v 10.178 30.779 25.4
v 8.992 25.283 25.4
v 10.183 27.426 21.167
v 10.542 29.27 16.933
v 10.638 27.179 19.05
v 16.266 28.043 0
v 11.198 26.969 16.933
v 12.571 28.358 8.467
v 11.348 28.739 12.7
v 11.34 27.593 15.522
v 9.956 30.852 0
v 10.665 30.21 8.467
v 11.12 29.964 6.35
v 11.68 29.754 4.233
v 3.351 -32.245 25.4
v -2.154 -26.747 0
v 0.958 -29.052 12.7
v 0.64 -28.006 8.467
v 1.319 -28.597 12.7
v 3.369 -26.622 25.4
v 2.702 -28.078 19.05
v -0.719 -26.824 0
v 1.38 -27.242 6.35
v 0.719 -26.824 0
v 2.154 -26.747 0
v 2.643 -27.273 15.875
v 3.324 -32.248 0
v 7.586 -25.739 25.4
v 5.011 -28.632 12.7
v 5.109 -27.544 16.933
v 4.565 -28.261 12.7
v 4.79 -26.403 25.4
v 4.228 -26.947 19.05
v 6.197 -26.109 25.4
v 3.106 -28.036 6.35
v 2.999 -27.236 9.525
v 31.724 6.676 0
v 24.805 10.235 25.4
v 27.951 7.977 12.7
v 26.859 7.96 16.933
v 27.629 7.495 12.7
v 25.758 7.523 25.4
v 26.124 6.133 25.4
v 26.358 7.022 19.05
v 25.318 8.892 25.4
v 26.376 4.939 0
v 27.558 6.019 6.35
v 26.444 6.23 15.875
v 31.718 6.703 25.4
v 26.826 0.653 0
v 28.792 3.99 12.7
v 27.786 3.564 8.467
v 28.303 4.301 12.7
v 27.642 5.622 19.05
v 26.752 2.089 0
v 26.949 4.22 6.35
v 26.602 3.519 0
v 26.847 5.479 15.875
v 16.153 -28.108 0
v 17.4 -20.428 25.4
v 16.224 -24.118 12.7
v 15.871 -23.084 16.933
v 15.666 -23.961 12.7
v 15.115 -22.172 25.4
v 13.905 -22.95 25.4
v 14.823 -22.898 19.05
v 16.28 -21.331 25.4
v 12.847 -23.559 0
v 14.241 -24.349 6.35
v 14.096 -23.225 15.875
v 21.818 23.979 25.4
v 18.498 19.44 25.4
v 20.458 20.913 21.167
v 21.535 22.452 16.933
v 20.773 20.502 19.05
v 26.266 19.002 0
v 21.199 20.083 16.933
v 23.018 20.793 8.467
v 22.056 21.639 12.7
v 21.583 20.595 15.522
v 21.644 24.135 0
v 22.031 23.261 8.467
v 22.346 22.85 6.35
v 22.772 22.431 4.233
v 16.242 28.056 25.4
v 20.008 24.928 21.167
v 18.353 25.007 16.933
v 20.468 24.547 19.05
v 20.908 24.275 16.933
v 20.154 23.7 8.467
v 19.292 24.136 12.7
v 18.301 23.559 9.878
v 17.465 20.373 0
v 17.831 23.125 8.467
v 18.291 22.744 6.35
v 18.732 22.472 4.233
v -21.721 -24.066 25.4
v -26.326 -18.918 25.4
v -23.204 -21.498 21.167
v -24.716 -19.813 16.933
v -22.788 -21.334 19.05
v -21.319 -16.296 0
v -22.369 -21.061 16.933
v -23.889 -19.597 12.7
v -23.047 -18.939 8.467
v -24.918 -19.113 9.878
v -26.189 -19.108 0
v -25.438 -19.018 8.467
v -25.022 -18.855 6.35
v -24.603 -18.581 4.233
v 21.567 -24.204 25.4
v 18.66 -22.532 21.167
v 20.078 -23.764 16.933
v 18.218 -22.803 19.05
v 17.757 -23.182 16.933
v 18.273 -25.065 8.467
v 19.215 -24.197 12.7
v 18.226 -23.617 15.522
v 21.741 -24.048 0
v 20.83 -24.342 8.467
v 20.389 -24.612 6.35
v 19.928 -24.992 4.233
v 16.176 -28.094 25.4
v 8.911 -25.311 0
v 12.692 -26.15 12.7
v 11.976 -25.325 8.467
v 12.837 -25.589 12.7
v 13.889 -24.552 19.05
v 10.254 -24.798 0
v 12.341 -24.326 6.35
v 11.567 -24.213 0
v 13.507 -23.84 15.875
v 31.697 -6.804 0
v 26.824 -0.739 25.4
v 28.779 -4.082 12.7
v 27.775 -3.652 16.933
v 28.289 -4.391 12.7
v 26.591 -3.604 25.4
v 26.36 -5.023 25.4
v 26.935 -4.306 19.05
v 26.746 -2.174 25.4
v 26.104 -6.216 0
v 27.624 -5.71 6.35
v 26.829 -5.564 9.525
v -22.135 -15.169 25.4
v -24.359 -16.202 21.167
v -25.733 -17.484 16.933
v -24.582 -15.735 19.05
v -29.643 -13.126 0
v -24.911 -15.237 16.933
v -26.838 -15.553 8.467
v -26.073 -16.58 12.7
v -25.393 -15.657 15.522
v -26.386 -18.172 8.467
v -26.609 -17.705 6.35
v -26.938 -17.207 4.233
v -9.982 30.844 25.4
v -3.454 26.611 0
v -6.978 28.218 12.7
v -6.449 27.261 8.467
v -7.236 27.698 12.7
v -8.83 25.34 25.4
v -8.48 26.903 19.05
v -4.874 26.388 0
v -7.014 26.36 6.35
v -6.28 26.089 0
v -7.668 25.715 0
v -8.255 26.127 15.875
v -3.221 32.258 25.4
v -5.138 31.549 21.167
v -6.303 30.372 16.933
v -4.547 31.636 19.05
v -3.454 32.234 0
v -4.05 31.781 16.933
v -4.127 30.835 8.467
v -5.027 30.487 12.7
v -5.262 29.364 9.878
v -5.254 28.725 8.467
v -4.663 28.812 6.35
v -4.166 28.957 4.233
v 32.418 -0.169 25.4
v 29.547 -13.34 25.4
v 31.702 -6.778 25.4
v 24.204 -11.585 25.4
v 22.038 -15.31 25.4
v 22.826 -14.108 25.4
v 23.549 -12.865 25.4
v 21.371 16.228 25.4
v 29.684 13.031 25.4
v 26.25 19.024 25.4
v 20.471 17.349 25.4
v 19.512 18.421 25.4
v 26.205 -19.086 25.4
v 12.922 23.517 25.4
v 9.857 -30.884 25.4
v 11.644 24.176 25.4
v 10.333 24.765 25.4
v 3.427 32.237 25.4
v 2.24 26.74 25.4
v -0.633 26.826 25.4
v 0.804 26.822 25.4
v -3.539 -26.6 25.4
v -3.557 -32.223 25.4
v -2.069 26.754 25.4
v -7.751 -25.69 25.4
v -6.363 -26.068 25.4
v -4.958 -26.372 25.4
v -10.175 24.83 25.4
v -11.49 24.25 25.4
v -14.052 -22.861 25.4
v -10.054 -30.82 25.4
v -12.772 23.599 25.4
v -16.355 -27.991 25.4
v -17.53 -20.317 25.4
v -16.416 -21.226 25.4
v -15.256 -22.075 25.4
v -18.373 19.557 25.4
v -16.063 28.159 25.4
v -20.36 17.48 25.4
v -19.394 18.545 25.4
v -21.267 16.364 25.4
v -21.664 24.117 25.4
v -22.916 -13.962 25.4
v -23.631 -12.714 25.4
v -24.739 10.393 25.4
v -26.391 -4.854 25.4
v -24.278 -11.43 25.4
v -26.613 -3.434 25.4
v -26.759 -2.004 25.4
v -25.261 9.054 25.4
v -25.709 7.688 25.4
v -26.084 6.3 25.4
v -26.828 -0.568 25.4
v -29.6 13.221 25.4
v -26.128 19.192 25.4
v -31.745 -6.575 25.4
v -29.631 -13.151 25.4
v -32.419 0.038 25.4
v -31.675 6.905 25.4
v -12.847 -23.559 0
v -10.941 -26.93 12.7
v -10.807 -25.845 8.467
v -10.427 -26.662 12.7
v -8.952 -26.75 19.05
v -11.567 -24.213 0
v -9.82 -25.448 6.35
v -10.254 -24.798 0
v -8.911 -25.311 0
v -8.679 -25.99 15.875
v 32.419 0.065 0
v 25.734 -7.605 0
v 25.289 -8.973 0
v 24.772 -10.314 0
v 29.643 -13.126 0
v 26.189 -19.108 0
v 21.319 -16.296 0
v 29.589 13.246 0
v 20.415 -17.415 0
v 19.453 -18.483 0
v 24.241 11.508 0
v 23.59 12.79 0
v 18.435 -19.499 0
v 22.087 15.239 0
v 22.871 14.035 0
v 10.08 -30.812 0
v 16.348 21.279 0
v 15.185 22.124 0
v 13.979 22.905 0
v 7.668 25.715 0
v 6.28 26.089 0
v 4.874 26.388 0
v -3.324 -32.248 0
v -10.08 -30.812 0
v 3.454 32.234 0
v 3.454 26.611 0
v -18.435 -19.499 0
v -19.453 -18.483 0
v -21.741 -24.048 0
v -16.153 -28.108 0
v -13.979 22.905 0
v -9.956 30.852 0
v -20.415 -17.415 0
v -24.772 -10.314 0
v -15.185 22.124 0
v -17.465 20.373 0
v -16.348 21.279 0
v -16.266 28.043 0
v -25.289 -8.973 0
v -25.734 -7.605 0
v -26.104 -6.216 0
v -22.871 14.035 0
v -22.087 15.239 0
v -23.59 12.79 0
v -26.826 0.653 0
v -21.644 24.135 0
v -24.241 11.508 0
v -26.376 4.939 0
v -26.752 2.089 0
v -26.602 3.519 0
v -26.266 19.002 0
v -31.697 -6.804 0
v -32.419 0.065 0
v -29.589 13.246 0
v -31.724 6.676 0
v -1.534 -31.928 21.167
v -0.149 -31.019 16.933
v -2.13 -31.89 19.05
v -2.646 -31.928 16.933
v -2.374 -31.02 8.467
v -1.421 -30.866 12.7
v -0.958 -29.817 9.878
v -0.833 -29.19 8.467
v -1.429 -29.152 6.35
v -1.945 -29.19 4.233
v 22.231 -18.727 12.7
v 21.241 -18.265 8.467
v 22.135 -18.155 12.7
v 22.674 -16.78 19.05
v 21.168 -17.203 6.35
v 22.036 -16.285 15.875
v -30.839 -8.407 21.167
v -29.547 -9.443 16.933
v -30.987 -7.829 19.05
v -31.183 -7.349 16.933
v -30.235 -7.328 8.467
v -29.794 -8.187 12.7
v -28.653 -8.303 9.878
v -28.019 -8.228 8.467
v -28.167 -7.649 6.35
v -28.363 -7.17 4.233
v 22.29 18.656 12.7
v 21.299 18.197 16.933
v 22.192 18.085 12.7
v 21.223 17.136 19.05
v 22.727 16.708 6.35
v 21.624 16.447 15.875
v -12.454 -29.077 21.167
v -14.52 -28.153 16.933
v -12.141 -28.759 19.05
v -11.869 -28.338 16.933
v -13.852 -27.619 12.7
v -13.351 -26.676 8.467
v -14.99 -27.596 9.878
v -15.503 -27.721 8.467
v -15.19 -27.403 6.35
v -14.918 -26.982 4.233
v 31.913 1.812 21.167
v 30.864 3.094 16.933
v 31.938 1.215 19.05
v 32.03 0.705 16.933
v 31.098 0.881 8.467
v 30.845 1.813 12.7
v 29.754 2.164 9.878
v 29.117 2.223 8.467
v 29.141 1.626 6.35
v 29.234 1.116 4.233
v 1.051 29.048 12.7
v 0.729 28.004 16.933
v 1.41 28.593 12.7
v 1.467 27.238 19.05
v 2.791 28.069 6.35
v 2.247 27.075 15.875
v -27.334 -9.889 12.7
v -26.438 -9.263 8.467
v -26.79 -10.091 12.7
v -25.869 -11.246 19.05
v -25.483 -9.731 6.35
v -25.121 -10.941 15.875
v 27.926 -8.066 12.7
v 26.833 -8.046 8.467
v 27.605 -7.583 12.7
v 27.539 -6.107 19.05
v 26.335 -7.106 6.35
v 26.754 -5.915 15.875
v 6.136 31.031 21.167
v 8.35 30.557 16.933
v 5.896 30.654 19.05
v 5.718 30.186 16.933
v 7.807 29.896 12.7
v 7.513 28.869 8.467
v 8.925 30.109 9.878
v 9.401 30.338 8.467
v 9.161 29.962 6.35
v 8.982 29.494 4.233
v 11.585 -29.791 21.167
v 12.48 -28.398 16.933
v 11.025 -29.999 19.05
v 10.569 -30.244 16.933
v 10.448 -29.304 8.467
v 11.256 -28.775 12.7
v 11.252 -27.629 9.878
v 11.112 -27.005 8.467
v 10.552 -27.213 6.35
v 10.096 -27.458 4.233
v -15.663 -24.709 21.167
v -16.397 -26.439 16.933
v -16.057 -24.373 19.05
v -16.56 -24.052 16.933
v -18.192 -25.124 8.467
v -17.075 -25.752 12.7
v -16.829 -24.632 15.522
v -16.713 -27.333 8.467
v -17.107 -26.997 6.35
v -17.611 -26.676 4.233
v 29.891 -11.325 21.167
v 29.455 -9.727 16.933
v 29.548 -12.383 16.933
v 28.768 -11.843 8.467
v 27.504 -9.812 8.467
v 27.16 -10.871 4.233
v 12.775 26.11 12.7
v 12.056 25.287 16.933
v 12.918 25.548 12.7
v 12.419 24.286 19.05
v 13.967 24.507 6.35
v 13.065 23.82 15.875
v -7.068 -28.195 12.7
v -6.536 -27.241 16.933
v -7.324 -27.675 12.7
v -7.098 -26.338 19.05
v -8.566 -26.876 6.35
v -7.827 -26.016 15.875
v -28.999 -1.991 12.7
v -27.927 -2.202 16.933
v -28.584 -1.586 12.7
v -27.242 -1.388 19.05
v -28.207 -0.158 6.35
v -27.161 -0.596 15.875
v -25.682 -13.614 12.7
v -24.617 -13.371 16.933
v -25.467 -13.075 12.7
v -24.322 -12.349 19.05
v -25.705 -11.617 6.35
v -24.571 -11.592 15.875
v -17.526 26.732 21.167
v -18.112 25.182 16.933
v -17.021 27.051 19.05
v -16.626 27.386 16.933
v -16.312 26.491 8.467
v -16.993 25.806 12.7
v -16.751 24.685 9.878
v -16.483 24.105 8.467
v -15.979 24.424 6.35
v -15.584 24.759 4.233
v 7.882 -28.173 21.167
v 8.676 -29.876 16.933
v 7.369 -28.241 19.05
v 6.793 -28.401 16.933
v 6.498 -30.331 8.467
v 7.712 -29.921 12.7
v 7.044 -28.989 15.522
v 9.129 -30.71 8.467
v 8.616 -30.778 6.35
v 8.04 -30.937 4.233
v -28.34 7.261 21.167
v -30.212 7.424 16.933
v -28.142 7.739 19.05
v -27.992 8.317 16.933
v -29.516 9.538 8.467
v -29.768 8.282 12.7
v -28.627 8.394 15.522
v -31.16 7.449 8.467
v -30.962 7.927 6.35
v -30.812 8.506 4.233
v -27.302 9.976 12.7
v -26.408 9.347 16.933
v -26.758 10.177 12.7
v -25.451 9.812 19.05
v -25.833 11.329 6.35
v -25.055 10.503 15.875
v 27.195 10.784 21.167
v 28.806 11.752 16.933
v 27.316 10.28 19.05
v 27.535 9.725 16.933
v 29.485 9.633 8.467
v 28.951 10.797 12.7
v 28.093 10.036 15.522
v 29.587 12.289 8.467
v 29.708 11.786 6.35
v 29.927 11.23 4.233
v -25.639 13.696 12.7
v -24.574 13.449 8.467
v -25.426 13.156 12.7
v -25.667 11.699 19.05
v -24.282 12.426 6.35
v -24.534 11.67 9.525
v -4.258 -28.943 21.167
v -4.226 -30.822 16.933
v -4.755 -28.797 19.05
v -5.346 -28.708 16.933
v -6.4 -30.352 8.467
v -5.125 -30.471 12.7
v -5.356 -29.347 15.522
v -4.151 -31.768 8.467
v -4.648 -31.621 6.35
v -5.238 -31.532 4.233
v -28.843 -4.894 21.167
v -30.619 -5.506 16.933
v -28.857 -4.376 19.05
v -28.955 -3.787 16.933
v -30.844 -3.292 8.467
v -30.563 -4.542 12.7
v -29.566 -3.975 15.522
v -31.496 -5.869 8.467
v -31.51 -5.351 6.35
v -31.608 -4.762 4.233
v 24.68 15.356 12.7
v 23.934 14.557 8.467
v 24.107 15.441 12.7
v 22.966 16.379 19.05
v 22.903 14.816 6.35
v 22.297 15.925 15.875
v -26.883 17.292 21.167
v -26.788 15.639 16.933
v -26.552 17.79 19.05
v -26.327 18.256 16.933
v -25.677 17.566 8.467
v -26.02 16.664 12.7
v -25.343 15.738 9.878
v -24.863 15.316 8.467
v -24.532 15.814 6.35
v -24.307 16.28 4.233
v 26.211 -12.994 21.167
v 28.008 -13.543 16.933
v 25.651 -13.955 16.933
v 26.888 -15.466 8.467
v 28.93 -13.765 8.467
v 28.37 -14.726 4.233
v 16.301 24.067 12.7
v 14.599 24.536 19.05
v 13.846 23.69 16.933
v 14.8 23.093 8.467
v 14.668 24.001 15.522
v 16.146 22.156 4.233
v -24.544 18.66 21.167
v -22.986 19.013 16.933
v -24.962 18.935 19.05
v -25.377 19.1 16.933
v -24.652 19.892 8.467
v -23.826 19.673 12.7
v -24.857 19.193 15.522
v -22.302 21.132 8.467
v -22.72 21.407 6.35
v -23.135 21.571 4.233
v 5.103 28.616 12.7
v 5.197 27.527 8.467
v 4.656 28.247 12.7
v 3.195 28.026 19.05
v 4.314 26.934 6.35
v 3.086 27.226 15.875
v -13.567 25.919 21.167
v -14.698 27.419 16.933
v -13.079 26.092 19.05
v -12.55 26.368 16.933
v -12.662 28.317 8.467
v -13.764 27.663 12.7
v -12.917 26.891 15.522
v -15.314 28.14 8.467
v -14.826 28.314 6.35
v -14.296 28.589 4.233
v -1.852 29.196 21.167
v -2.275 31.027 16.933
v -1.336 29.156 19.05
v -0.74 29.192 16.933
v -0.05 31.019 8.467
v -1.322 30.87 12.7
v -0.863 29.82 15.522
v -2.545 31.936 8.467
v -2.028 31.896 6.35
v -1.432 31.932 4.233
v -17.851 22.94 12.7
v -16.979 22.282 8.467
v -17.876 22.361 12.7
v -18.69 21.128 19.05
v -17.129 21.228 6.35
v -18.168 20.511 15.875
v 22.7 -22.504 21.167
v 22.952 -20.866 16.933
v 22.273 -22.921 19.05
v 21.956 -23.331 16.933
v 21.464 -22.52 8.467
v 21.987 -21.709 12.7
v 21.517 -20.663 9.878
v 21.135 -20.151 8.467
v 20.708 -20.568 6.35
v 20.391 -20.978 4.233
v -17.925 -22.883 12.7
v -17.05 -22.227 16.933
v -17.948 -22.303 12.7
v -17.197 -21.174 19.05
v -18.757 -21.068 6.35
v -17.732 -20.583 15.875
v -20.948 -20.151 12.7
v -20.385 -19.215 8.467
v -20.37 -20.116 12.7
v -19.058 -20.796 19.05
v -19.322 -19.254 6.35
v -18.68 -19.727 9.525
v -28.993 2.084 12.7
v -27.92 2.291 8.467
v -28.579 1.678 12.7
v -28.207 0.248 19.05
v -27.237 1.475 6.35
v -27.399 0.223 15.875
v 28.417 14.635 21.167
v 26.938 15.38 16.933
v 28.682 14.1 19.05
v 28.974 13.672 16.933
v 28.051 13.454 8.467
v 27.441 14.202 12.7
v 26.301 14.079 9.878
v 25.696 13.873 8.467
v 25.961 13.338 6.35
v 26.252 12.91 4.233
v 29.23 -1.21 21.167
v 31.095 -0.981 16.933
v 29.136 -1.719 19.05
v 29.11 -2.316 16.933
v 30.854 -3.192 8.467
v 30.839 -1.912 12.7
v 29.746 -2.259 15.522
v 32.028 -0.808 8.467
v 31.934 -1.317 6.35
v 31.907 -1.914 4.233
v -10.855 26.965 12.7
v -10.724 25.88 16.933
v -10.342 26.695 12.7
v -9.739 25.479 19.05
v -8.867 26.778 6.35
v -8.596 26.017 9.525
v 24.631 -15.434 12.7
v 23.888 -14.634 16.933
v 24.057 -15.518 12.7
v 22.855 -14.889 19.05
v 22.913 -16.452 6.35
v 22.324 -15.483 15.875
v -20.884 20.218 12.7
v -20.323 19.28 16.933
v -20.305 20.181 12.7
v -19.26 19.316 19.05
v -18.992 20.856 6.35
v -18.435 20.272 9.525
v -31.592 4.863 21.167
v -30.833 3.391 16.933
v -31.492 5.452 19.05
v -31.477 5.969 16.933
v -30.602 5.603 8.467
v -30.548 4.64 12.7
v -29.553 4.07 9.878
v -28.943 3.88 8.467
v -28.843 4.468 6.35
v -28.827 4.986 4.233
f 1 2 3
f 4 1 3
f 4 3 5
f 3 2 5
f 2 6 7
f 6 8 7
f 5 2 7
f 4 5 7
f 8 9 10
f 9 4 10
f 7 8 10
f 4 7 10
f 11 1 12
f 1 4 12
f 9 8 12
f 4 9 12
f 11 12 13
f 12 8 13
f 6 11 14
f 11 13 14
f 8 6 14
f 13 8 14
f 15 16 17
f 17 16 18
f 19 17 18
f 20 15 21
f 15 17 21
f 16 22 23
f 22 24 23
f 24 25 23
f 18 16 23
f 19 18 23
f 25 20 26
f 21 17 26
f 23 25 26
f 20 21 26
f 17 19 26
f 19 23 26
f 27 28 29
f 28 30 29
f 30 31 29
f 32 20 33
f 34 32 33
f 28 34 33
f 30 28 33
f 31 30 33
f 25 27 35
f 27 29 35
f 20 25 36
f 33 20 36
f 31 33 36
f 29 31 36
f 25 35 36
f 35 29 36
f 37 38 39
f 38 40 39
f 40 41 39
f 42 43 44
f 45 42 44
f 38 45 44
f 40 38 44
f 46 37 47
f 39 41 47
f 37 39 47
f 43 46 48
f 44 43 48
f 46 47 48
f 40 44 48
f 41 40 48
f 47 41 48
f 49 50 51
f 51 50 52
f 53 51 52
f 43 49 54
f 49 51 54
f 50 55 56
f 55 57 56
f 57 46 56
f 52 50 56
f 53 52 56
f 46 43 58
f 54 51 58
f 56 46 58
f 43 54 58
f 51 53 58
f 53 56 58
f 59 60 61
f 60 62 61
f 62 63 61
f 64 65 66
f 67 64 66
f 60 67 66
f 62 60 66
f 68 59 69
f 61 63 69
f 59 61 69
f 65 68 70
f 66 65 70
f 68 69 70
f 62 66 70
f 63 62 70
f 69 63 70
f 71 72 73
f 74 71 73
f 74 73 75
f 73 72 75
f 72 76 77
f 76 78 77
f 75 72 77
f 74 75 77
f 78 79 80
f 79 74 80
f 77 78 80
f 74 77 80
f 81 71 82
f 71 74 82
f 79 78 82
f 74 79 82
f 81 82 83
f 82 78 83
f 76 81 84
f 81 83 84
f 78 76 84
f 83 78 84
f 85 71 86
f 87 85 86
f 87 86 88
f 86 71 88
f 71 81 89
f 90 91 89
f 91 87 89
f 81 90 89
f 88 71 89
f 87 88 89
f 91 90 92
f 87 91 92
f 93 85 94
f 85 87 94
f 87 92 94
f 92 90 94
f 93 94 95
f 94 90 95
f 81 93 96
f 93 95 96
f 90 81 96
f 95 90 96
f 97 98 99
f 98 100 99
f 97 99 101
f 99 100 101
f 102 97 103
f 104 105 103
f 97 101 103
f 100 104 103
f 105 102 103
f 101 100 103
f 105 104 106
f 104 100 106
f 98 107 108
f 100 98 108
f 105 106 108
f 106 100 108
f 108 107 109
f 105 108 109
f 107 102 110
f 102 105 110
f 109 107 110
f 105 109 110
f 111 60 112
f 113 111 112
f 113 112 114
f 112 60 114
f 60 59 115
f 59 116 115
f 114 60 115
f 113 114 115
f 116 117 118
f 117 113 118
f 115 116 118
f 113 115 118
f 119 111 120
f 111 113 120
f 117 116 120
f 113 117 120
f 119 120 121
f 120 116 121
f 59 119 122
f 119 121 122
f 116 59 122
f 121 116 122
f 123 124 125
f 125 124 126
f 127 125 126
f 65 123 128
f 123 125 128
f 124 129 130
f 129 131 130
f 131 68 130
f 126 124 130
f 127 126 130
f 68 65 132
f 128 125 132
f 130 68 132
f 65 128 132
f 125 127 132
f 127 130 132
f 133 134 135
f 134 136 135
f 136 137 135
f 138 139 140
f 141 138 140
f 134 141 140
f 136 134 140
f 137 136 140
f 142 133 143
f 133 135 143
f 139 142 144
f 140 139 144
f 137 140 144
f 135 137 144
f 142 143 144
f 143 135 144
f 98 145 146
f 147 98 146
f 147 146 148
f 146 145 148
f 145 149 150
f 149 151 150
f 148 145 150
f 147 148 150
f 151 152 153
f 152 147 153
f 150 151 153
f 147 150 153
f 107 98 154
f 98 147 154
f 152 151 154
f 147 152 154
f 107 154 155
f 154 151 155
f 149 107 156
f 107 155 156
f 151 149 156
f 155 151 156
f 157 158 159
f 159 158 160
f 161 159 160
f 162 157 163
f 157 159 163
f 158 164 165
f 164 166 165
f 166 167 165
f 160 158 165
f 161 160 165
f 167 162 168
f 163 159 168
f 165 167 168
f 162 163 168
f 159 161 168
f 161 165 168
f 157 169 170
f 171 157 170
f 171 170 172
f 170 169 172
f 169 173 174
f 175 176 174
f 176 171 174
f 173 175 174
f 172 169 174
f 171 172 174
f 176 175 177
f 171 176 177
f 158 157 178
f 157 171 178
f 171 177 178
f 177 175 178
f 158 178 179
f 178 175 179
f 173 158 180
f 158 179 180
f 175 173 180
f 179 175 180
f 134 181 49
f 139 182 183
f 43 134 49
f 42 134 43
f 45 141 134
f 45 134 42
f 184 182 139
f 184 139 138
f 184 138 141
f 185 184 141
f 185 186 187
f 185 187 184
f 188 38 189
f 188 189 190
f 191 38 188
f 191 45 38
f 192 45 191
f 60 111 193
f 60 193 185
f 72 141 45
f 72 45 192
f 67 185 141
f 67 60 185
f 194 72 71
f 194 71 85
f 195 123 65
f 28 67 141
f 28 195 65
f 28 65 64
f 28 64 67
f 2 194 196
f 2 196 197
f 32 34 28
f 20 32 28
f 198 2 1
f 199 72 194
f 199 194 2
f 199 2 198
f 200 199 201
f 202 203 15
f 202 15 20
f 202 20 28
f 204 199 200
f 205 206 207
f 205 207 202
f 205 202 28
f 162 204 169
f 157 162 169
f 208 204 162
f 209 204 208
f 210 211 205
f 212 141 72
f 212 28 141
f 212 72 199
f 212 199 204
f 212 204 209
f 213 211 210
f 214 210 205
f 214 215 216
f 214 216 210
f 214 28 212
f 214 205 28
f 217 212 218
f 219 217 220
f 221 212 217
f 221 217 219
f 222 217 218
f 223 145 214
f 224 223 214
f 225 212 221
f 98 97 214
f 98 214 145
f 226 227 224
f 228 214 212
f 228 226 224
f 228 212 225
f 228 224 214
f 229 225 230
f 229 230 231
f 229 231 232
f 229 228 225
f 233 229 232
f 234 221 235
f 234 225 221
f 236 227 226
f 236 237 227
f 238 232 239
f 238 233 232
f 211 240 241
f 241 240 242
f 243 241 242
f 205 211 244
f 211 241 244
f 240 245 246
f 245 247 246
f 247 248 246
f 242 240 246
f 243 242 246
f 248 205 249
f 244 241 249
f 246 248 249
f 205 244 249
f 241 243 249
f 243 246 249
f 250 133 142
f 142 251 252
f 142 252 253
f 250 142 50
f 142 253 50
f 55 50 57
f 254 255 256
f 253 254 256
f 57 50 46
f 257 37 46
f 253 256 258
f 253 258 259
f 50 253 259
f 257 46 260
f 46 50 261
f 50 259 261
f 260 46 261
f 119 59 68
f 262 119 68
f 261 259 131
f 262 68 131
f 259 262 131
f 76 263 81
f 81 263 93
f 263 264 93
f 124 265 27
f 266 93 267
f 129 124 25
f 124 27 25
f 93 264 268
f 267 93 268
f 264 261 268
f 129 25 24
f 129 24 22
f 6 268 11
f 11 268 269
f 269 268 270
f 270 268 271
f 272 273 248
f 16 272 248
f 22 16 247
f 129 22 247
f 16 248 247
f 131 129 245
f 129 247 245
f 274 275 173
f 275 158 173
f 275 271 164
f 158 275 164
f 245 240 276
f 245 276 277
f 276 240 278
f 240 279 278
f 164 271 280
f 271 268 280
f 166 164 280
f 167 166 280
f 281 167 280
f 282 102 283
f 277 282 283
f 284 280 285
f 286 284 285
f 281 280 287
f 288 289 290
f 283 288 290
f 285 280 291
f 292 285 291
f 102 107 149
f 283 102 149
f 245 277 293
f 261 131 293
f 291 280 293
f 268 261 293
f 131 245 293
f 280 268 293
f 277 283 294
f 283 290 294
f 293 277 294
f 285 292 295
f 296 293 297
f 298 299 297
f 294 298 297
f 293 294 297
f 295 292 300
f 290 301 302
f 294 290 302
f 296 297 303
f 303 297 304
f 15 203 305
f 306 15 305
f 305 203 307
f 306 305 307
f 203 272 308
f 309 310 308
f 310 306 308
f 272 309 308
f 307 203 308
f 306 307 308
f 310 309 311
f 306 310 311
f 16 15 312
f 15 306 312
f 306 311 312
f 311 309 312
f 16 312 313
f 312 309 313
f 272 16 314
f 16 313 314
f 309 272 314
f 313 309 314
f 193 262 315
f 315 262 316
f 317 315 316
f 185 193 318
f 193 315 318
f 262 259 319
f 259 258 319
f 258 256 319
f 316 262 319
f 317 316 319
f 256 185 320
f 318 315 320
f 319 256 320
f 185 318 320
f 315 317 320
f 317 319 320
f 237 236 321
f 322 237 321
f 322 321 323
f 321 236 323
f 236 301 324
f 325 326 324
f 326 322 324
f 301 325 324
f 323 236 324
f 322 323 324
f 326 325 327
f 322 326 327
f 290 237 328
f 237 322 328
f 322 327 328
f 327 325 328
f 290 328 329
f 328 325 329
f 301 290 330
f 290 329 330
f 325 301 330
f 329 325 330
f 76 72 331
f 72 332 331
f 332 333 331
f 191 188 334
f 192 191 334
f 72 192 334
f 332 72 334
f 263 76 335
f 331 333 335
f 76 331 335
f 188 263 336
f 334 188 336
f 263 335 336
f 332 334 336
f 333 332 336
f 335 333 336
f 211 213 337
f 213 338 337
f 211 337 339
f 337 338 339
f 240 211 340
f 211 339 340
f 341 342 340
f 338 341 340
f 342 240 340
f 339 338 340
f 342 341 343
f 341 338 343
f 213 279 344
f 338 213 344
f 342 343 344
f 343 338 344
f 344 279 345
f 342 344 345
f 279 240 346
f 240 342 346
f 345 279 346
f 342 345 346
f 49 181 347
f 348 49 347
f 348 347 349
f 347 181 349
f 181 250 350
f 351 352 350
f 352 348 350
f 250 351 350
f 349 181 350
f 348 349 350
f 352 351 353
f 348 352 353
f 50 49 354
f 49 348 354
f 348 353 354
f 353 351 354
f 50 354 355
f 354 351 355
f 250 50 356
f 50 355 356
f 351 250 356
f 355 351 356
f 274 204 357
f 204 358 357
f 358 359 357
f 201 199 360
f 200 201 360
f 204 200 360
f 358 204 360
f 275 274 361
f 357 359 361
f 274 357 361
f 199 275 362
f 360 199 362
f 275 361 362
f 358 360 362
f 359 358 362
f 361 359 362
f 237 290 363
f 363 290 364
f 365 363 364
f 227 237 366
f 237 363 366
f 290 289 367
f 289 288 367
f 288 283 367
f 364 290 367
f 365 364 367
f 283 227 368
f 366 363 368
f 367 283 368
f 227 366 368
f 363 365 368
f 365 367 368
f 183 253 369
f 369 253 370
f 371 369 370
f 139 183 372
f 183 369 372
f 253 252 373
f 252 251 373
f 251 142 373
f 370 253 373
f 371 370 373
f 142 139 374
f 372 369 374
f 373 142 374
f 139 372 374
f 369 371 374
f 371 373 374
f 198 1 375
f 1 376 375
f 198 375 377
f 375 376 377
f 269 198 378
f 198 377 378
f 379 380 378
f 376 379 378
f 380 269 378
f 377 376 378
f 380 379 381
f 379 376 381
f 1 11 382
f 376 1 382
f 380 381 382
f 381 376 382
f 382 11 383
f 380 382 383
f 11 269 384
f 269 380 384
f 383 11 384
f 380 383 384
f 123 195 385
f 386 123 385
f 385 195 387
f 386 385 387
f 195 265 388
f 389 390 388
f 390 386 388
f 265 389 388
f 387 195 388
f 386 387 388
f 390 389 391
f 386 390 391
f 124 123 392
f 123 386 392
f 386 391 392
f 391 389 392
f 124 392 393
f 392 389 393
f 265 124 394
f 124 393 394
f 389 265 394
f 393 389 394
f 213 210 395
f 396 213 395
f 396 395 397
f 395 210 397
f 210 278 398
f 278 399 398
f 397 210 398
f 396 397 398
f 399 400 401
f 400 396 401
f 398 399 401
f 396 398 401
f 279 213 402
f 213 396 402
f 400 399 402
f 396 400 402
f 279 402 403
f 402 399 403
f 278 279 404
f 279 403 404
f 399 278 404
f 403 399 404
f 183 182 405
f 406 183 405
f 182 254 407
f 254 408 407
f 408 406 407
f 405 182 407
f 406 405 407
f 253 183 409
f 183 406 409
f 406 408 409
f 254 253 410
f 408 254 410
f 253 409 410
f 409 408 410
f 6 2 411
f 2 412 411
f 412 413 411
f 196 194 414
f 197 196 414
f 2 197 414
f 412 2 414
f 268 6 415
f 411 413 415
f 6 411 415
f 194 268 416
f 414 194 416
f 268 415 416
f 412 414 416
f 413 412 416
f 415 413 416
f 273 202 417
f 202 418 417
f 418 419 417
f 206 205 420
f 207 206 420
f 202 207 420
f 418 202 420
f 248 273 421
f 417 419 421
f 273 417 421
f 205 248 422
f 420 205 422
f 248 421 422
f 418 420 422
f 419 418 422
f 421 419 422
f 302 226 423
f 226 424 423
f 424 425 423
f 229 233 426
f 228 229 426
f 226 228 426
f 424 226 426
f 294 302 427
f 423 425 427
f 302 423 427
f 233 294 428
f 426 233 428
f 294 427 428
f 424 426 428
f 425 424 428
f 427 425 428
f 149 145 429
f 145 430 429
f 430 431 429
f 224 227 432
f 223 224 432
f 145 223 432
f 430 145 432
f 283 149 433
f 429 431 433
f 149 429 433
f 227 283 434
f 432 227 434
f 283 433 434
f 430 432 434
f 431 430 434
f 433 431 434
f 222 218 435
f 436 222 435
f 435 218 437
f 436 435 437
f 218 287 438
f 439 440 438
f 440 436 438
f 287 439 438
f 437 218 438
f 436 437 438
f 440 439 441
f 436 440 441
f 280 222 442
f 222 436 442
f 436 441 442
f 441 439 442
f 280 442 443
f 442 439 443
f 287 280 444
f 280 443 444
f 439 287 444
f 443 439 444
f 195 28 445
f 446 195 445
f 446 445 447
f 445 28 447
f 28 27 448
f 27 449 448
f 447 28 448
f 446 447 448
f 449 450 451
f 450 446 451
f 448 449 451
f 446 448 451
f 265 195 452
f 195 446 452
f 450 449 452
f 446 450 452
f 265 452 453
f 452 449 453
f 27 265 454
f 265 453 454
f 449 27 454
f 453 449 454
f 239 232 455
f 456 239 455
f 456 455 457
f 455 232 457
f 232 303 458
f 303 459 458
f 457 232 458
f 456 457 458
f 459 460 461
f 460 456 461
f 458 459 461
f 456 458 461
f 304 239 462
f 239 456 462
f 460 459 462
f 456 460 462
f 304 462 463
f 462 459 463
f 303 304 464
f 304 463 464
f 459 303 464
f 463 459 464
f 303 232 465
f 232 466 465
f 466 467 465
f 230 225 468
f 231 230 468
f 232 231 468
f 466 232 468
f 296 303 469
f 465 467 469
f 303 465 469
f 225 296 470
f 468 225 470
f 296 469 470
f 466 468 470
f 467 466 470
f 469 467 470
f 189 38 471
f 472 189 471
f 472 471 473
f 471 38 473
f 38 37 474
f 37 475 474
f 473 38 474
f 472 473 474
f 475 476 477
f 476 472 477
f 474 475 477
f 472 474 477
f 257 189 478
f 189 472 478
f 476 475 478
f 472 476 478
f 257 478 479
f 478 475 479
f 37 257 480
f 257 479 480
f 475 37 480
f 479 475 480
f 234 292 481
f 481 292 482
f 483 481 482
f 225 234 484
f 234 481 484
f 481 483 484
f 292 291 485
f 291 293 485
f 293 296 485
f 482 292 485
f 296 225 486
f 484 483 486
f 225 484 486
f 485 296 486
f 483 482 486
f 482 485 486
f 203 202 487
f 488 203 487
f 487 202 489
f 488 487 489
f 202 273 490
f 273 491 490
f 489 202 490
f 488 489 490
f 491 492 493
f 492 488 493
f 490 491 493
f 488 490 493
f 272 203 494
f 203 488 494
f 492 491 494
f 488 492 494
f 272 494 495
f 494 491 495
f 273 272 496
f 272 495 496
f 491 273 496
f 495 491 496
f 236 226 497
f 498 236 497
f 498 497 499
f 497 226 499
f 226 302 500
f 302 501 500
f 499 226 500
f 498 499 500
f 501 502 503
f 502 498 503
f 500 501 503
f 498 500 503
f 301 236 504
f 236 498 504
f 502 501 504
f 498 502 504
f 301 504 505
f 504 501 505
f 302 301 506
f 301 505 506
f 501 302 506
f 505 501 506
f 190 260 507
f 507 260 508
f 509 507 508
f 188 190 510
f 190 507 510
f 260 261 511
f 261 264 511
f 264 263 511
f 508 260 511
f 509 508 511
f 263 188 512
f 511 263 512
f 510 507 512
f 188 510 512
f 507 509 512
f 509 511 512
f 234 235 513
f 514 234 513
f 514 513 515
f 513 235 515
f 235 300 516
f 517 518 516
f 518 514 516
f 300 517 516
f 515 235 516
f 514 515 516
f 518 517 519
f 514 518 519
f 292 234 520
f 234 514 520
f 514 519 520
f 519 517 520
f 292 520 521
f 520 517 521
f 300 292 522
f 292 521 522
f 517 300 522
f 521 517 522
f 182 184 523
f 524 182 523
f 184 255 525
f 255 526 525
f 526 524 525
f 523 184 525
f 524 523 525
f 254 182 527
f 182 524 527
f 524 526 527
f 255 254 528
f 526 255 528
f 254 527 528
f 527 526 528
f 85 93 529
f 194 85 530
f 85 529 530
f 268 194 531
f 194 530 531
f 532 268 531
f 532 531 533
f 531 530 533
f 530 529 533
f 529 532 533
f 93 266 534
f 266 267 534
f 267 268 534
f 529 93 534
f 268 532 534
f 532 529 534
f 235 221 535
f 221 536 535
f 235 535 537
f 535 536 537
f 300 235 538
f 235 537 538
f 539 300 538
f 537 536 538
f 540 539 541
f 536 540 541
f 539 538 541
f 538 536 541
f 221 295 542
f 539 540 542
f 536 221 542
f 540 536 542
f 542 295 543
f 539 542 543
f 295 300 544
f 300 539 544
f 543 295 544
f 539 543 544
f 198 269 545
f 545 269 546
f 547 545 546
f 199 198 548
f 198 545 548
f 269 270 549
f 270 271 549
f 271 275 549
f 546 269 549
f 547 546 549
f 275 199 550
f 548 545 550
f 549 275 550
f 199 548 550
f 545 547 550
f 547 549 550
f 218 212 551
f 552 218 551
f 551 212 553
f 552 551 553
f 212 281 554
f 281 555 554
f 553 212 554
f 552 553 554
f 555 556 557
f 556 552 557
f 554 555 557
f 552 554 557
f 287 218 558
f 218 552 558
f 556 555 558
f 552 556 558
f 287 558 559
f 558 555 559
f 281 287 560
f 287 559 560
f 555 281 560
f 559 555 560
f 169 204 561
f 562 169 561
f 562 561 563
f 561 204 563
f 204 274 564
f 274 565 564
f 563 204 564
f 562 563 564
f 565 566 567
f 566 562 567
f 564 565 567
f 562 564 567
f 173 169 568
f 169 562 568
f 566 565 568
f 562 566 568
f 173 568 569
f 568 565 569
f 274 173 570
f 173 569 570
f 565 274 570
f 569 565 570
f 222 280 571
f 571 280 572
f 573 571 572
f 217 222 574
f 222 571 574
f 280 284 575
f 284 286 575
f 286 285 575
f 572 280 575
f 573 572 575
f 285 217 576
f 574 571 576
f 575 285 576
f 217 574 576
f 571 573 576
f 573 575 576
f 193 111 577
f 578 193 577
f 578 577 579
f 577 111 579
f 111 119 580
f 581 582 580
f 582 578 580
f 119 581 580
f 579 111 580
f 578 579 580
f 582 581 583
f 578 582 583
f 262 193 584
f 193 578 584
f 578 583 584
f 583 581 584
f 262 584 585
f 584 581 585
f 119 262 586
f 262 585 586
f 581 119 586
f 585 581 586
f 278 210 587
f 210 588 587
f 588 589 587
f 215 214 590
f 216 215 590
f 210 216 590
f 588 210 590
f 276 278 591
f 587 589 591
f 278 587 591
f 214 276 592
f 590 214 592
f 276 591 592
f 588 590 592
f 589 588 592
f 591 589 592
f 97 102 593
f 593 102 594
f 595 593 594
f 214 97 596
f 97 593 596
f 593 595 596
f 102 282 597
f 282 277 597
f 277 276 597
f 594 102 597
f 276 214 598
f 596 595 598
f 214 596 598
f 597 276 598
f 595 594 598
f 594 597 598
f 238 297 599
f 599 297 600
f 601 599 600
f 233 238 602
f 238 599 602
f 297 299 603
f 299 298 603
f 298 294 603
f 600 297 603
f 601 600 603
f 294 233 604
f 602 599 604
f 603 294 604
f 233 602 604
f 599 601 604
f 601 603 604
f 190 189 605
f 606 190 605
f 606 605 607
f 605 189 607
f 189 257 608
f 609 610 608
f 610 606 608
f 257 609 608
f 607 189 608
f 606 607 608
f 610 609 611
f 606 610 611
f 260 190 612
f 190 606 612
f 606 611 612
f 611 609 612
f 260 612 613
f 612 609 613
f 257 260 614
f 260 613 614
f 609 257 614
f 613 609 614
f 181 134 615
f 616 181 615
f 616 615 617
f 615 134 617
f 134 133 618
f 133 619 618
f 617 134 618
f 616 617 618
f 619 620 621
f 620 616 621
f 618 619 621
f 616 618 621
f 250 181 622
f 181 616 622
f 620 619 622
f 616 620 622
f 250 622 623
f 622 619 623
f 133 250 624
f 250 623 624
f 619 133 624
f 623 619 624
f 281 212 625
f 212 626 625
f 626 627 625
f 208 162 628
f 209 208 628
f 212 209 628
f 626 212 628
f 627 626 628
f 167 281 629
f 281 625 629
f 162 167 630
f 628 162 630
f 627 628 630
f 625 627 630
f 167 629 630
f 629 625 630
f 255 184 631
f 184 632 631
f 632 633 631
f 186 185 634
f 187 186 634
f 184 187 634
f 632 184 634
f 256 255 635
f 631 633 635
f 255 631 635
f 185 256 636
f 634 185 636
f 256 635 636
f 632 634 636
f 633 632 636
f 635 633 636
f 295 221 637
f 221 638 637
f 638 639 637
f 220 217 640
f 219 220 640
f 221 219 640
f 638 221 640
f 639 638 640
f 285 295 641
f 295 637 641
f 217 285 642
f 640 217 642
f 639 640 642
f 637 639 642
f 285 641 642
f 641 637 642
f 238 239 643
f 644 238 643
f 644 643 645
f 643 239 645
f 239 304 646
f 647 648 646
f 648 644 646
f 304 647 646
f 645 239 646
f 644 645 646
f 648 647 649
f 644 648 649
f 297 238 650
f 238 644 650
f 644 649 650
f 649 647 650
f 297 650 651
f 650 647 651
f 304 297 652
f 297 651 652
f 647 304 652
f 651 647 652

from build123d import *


with BuildPart() as f3:
    # F2 (on offset) → F3 section 0
    with BuildSketch(Plane.XY.offset(25.4)):
        with BuildLine():
            Line((-21.66401, 24.117318), (-18.373145, 19.557289))
            ThreePointArc((-18.373145, 19.557289), (-19.884077, 18.018976), (-21.26662, 16.364317))
            Line((-21.26662, 16.364317), (-26.127705, 19.191596))
            Line((-26.127705, 19.191596), (-29.600454, 13.220719))
            Line((-29.600454, 13.220719), (-24.739369, 10.393441))
            ThreePointArc((-24.739369, 10.393441), (-25.493986, 8.373571), (-26.083992, 6.299634))
            Line((-26.083992, 6.299634), (-31.674772, 6.9053))
            Line((-31.674772, 6.9053), (-32.418712, 0.038139))
            Line((-32.418712, 0.038139), (-26.827932, -0.567527))
            ThreePointArc((-26.827932, -0.567527), (-26.695753, -2.7197), (-26.391204, -4.854313))
            Line((-26.391204, -4.854313), (-31.744982, -6.574985))
            Line((-31.744982, -6.574985), (-29.631479, -13.151037))
            Line((-29.631479, -13.151037), (-24.277701, -11.430365))
            ThreePointArc((-24.277701, -11.430365), (-23.281582, -13.342711), (-22.135138, -15.168905))
            Line((-22.135138, -15.168905), (-26.326197, -18.918395))
            Line((-26.326197, -18.918395), (-21.720695, -24.066278))
            Line((-21.720695, -24.066278), (-17.529635, -20.316788))
            ThreePointArc((-17.529635, -20.316788), (-15.841814, -21.658646), (-14.051705, -22.860656))
            Line((-14.051705, -22.860656), (-16.355374, -27.990643))
            Line((-16.355374, -27.990643), (-10.054205, -30.820242))
            Line((-10.054205, -30.820242), (-7.750536, -25.690255))
            ThreePointArc((-7.750536, -25.690255), (-5.662853, -26.229604), (-3.538605, -26.599592))
            Line((-3.538605, -26.599592), (-3.556557, -32.223054))
            Line((-3.556557, -32.223054), (3.350748, -32.245105))
            Line((3.350748, -32.245105), (3.368701, -26.621643))
            ThreePointArc((3.368701, -26.621643), (5.495268, -26.265225), (7.586352, -25.739216))
            Line((7.586352, -25.739216), (9.85722, -30.883807))
            Line((9.85722, -30.883807), (16.176327, -28.094497))
            Line((16.176327, -28.094497), (13.905459, -22.949907))
            ThreePointArc((13.905459, -22.949907), (15.703206, -21.75935), (17.39956, -20.428297))
            Line((17.39956, -20.428297), (21.566595, -24.204469))
            Line((21.566595, -24.204469), (26.204871, -19.086096))
            Line((26.204871, -19.086096), (22.037837, -15.309923))
            ThreePointArc((22.037837, -15.309923), (23.195918, -13.491086), (24.204226, -11.585139))
            Line((24.204226, -11.585139), (29.546909, -13.339958))
            Line((29.546909, -13.339958), (31.702356, -6.777535))
            Line((31.702356, -6.777535), (26.359673, -5.022715))
            ThreePointArc((26.359673, -5.022715), (26.677844, -2.890091), (26.823761, -0.738805))
            Line((26.823761, -0.738805), (32.418295, -0.168848))
            Line((32.418295, -0.168848), (31.718215, 6.702924))
            Line((31.718215, 6.702924), (26.123682, 6.132966))
            ThreePointArc((26.123682, 6.132966), (25.546929, 8.210628), (24.805225, 10.235274))
            Line((24.805225, 10.235274), (29.684262, 13.031458))
            Line((29.684262, 13.031458), (26.249706, 19.024386))
            Line((26.249706, 19.024386), (21.370669, 16.228202))
            ThreePointArc((21.370669, 16.228202), (19.998718, 17.891654), (18.497639, 19.439582))
            Line((18.497639, 19.439582), (21.817551, 23.978507))
            Line((21.817551, 23.978507), (16.242385, 28.056359))
            Line((16.242385, 28.056359), (12.922473, 23.517434))
            ThreePointArc((12.922473, 23.517434), (10.992547, 24.479051), (8.991644, 25.28261))
            Line((8.991644, 25.28261), (10.178388, 30.779453))
            Line((10.178388, 30.779453), (3.426608, 32.237132))
            Line((3.426608, 32.237132), (2.239864, 26.740288))
            ThreePointArc((2.239864, 26.740288), (0.085664, 26.833797), (-2.069088, 26.754044))
            Line((-2.069088, 26.754044), (-3.220712, 32.258353))
            Line((-3.220712, 32.258353), (-9.981661, 30.843813))
            Line((-9.981661, 30.843813), (-8.830037, 25.339504))
            ThreePointArc((-8.830037, 25.339504), (-10.83603, 24.548736), (-12.772056, 23.599461))
            Line((-12.772056, 23.599461), (-16.062921, 28.15949))
            Line((-16.062921, 28.15949), (-21.66401, 24.117318))
        make_face()
    # F0 (on Top) → F3 section 1
    with BuildSketch(Plane.XY):
        with BuildLine():
            Line((-26.265668, 19.002342), (-22.0866, 15.239492))
            ThreePointArc((-22.0866, 15.239492), (-23.238868, 13.416967), (-24.241087, 11.507811))
            Line((-24.241087, 11.507811), (-29.589345, 13.245565))
            Line((-29.589345, 13.245565), (-31.723831, 6.676294))
            Line((-31.723831, 6.676294), (-26.375573, 4.938539))
            ThreePointArc((-26.375573, 4.938539), (-26.686935, 2.80491), (-26.825983, 0.65317))
            Line((-26.825983, 0.65317), (-32.418668, 0.065355))
            Line((-32.418668, 0.065355), (-31.696655, -6.804147))
            Line((-31.696655, -6.804147), (-26.10397, -6.216332))
            ThreePointArc((-26.10397, -6.216332), (-25.520588, -8.292142), (-24.772423, -10.31441))
            Line((-24.772423, -10.31441), (-29.642509, -13.126156))
            Line((-29.642509, -13.126156), (-26.188839, -19.108088))
            Line((-26.188839, -19.108088), (-21.318753, -16.296343))
            ThreePointArc((-21.318753, -16.296343), (-19.941499, -17.955406), (-18.435486, -19.498535))
            Line((-18.435486, -19.498535), (-21.740891, -24.048035))
            Line((-21.740891, -24.048035), (-16.152735, -28.108068))
            Line((-16.152735, -28.108068), (-12.84733, -23.558568))
            ThreePointArc((-12.84733, -23.558568), (-10.914344, -24.514018), (-8.910886, -25.311186))
            Line((-8.910886, -25.311186), (-10.080076, -30.81179))
            Line((-10.080076, -30.81179), (-3.323677, -32.247907))
            Line((-3.323677, -32.247907), (-2.154487, -26.747303))
            ThreePointArc((-2.154487, -26.747303), (0, -26.833934), (2.154487, -26.747303))
            Line((2.154487, -26.747303), (3.323677, -32.247907))
            Line((3.323677, -32.247907), (10.080076, -30.81179))
            Line((10.080076, -30.81179), (8.910886, -25.311186))
            ThreePointArc((8.910886, -25.311186), (10.914344, -24.514018), (12.84733, -23.558568))
            Line((12.84733, -23.558568), (16.152735, -28.108068))
            Line((16.152735, -28.108068), (21.740891, -24.048035))
            Line((21.740891, -24.048035), (18.435486, -19.498535))
            ThreePointArc((18.435486, -19.498535), (19.941499, -17.955406), (21.318753, -16.296343))
            Line((21.318753, -16.296343), (26.188839, -19.108088))
            Line((26.188839, -19.108088), (29.642509, -13.126156))
            Line((29.642509, -13.126156), (24.772423, -10.31441))
            ThreePointArc((24.772423, -10.31441), (25.520588, -8.292142), (26.10397, -6.216332))
            Line((26.10397, -6.216332), (31.696655, -6.804147))
            Line((31.696655, -6.804147), (32.418668, 0.065355))
            Line((32.418668, 0.065355), (26.825983, 0.65317))
            ThreePointArc((26.825983, 0.65317), (26.686935, 2.80491), (26.375573, 4.938539))
            Line((26.375573, 4.938539), (31.723831, 6.676294))
            Line((31.723831, 6.676294), (29.589345, 13.245565))
            Line((29.589345, 13.245565), (24.241087, 11.507811))
            ThreePointArc((24.241087, 11.507811), (23.238868, 13.416967), (22.0866, 15.239492))
            Line((22.0866, 15.239492), (26.265668, 19.002342))
            Line((26.265668, 19.002342), (21.643755, 24.135496))
            Line((21.643755, 24.135496), (17.464687, 20.372646))
            ThreePointArc((17.464687, 20.372646), (15.772591, 21.709109), (13.978653, 22.905398))
            Line((13.978653, 22.905398), (16.265933, 28.042713))
            Line((16.265933, 28.042713), (9.955763, 30.852181))
            Line((9.955763, 30.852181), (7.668483, 25.714867))
            ThreePointArc((7.668483, 25.714867), (5.579089, 26.247548), (3.45367, 26.610753))
            Line((3.45367, 26.610753), (3.45367, 32.234244))
            Line((3.45367, 32.234244), (-3.45367, 32.234244))
            Line((-3.45367, 32.234244), (-3.45367, 26.610753))
            ThreePointArc((-3.45367, 26.610753), (-5.579089, 26.247548), (-7.668483, 25.714867))
            Line((-7.668483, 25.714867), (-9.955763, 30.852181))
            Line((-9.955763, 30.852181), (-16.265933, 28.042713))
            Line((-16.265933, 28.042713), (-13.978653, 22.905398))
            ThreePointArc((-13.978653, 22.905398), (-15.772591, 21.709109), (-17.464687, 20.372646))
            Line((-17.464687, 20.372646), (-21.643755, 24.135496))
            Line((-21.643755, 24.135496), (-26.265668, 19.002342))
        make_face()
    loft()


solid = f3.part
